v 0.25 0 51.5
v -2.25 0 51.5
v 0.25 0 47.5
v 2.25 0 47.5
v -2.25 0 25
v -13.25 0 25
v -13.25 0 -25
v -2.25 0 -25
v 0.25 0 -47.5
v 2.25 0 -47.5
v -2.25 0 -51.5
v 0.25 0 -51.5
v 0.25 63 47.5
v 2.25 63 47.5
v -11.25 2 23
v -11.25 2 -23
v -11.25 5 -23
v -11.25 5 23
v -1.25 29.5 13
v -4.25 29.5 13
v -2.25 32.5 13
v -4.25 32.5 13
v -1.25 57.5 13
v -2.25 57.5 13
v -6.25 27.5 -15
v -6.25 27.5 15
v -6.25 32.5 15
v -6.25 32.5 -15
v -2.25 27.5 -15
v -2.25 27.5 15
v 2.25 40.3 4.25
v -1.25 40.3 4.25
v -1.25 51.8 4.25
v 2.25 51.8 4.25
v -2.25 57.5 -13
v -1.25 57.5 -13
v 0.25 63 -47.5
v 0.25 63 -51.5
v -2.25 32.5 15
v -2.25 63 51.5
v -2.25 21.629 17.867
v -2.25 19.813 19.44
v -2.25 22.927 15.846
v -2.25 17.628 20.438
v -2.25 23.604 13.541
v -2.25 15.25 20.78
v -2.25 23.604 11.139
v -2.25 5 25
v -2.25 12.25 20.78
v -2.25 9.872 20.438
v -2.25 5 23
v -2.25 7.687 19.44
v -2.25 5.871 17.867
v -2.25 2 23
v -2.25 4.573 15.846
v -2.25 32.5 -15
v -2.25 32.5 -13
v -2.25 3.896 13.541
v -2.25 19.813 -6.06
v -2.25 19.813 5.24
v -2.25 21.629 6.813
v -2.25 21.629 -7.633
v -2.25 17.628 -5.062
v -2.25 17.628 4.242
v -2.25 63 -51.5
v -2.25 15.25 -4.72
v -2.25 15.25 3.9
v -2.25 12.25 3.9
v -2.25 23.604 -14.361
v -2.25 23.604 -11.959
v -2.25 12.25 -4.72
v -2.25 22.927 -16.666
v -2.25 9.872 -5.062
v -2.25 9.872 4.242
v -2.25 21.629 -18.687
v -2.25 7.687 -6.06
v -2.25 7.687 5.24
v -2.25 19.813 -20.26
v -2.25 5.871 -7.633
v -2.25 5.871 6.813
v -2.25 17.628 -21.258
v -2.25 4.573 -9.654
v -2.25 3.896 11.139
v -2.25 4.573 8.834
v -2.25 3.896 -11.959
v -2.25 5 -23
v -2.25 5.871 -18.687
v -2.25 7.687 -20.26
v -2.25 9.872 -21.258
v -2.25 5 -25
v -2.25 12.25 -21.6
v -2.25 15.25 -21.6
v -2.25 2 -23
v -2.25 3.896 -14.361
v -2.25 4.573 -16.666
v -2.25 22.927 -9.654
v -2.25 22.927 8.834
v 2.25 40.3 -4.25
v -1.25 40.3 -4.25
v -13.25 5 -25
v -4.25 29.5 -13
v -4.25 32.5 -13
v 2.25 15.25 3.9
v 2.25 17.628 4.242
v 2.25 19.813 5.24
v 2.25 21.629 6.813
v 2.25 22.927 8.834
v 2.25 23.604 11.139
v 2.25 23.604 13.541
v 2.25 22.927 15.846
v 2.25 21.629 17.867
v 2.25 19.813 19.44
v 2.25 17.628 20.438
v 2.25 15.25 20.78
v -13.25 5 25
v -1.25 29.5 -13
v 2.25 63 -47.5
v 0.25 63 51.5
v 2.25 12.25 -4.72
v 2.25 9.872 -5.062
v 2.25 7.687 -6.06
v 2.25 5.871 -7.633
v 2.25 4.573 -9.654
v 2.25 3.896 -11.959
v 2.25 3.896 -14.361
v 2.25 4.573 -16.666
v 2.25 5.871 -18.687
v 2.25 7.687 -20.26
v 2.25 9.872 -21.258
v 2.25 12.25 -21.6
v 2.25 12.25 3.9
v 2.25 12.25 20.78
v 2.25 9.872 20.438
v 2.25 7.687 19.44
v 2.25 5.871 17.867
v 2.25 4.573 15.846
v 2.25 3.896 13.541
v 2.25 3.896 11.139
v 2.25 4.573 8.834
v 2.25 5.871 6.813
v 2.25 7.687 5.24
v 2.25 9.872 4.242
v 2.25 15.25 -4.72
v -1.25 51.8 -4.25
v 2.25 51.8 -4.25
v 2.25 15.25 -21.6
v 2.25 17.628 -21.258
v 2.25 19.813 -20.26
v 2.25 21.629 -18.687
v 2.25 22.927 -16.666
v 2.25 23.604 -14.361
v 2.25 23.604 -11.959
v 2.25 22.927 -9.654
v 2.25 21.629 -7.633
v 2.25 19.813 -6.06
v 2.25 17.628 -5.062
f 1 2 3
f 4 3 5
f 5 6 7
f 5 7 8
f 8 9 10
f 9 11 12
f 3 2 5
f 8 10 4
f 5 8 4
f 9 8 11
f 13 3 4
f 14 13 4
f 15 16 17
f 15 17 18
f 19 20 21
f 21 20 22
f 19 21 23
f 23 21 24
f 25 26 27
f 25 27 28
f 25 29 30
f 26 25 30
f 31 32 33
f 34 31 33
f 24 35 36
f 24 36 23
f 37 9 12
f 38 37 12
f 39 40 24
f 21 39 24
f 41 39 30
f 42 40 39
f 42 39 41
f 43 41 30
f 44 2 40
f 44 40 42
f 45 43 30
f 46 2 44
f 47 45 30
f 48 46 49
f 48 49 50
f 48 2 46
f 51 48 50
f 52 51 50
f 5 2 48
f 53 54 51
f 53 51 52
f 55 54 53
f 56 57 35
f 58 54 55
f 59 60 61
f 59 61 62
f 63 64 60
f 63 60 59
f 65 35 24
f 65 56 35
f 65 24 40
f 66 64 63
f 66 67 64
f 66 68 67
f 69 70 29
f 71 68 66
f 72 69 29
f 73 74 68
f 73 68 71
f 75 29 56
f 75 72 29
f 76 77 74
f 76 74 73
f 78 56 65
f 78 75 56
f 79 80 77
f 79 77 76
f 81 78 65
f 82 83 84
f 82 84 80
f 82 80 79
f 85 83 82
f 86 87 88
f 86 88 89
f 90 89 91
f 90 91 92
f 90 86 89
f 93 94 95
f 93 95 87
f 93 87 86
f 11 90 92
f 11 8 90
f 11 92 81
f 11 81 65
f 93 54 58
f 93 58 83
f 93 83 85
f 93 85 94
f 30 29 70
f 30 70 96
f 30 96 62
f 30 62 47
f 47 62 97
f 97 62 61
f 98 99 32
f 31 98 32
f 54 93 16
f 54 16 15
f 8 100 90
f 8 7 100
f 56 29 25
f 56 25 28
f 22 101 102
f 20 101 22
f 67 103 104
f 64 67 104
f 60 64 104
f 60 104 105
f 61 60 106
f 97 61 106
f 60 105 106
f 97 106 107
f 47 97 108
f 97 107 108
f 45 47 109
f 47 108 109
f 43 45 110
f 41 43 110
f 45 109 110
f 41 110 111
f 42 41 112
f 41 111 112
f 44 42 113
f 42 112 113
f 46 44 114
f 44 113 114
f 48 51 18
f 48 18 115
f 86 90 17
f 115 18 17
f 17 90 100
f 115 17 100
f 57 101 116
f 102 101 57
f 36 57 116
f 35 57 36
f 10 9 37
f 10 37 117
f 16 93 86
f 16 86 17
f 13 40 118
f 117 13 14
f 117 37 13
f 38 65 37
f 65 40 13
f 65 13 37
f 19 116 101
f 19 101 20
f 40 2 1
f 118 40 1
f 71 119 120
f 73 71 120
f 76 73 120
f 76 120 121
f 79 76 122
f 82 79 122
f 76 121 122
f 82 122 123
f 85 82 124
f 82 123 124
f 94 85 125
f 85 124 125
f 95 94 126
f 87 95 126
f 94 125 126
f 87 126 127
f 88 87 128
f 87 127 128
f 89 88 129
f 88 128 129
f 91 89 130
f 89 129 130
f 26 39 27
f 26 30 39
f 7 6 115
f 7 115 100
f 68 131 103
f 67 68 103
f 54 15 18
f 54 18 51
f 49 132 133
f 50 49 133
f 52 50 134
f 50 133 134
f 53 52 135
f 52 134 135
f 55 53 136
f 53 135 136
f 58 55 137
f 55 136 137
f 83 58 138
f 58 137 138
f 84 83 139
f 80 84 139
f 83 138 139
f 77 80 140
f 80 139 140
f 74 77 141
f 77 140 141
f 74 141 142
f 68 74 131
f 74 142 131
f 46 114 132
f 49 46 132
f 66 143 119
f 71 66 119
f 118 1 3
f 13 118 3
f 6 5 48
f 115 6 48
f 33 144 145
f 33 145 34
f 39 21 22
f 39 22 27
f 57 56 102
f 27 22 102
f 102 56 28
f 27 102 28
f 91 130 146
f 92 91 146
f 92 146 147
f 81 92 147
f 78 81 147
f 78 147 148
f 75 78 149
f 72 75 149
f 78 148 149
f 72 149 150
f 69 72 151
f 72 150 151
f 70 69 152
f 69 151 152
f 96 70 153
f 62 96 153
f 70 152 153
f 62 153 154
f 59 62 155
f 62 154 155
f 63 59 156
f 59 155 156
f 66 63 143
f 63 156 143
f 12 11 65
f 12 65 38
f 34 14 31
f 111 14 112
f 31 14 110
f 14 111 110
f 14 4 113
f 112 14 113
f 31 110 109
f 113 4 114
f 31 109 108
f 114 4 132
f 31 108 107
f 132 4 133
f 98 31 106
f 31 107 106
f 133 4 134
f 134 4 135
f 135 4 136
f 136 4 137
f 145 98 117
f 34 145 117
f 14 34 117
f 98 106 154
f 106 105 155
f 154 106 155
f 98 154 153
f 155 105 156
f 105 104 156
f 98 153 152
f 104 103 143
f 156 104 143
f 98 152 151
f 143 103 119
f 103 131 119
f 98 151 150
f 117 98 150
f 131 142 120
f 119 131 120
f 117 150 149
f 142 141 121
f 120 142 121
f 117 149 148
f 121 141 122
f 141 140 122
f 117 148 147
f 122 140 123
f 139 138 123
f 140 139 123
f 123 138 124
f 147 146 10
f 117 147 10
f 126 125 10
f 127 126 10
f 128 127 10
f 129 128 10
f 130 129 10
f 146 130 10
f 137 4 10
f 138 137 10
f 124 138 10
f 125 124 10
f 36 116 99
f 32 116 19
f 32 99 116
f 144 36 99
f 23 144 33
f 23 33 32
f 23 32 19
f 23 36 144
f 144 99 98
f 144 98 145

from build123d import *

# Parameters (mm, degrees)
SKETCH_1_W          = 2.5
SKETCH_1_H          = 103
SKETCH_1_W_2        = 2
SKETCH_1_H_2        = 95
EXTRUDE_1_DEPTH     = 63
SKETCH_5_W          = 50
SKETCH_5_H          = 2
EXTRUDE_2_DEPTH     = 11
EXTRUDE_3_DEPTH     = 3
CUT_EXTRUDE_1_DEPTH = 4.5
SKETCH_11_W         = 8.5
SKETCH_11_H         = 11.5
CUT_EXTRUDE_2_DEPTH = 4.5
SKETCH_12_W         = 26
SKETCH_12_H         = 28
SKETCH_12_W_2       = 25
SKETCH_12_H_2       = 27
SKETCH_12_W_3       = 8.5
SKETCH_12_H_3       = 11.5
CUT_EXTRUDE_3_DEPTH = 1
SKETCH_13_W         = 30
SKETCH_13_H         = 2
EXTRUDE_4_DEPTH     = 4
EXTRUDE_5_DEPTH     = 3


with BuildPart() as part:
    # 스케치1 → 보스-돌출1 (new body)
    with BuildSketch(Plane(origin=(0, 0, 0), x_dir=(1, 0, 0), z_dir=(0, 1, 0))):
        with Locations((-1, 0)):
            Rectangle(SKETCH_1_W, SKETCH_1_H)
        with Locations((1.25, 0)):
            Rectangle(SKETCH_1_W_2, SKETCH_1_H_2)
    extrude(amount=EXTRUDE_1_DEPTH)

    # 스케치5 → 보스-돌출2 (add)
    with BuildSketch(Plane.ZY.offset(2.25)):
        with Locations((0, 1)):
            Rectangle(SKETCH_5_W, SKETCH_5_H)
    extrude(amount=EXTRUDE_2_DEPTH)

    # 스케치7 → 보스-돌출3 (add)
    with BuildSketch(Plane(origin=(0, 2, 0), x_dir=(1, 0, 0), z_dir=(0, 1, 0))):
        Polygon((-2.25, 23), (-11.25, 23), (-11.25, -23), (-2.25, -23), (-2.25, -25), (-13.25, -25), (-13.25, 25), (-2.25, 25), align=None)
    extrude(amount=EXTRUDE_3_DEPTH)

    # 스케치10 → 컷-돌출1 (cut)
    with BuildSketch(Plane(origin=(2.25, 0, 0), x_dir=(0, 0, -1), z_dir=(1, 0, 0))):
        with BuildLine():
            Line((-20.78, 15.25), (-20.78, 12.25))
            ThreePointArc((-20.78, 12.25), (-12.34, 3.81), (-3.9, 12.25))
            Line((-3.9, 12.25), (-3.9, 15.25))
            ThreePointArc((-3.9, 15.25), (-12.34, 23.69), (-20.78, 15.25))
        make_face()
        with BuildLine():
            Line((4.72, 15.25), (4.72, 12.25))
            ThreePointArc((4.72, 12.25), (13.16, 3.81), (21.6, 12.25))
            Line((21.6, 12.25), (21.6, 15.25))
            ThreePointArc((21.6, 15.25), (13.16, 23.69), (4.72, 15.25))
        make_face()
    extrude(amount=-CUT_EXTRUDE_1_DEPTH, mode=Mode.SUBTRACT)

    # 스케치11 → 컷-돌출2 (cut)
    with BuildSketch(Plane.ZY.offset(2.25)):
        with Locations((0, 46.05)):
            Rectangle(SKETCH_11_W, SKETCH_11_H)
    extrude(amount=-CUT_EXTRUDE_2_DEPTH, mode=Mode.SUBTRACT)

    # 스케치12 → 컷-돌출3 (cut)
    # profile 1 of 2: a face of its own
    with BuildSketch(Plane.ZY.offset(2.25)):
        with Locations((0, 43.5)):
            Rectangle(SKETCH_12_W, SKETCH_12_H)
        with Locations((0, 43.5)):
            Rectangle(SKETCH_12_W_2, SKETCH_12_H_2, mode=Mode.SUBTRACT)
    # profile 2 of 2: a face of its own
    with BuildSketch(Plane.ZY.offset(2.25)):
        with Locations((0, 43.5)):
            Rectangle(SKETCH_12_W_2, SKETCH_12_H_2)
        with Locations((0, 46.05)):
            Rectangle(SKETCH_12_W_3, SKETCH_12_H_3, mode=Mode.SUBTRACT)
    extrude(amount=-CUT_EXTRUDE_3_DEPTH, mode=Mode.SUBTRACT)

    # 스케치13 → 보스-돌출4 (add)
    with BuildSketch(Plane.ZY.offset(2.25)):
        with Locations((0, 28.5)):
            Rectangle(SKETCH_13_W, SKETCH_13_H)
    extrude(amount=EXTRUDE_4_DEPTH)

    # 스케치14 → 보스-돌출5 (add)
    with BuildSketch(Plane(origin=(0, 29.5, 0), x_dir=(1, 0, 0), z_dir=(0, 1, 0))):
        Polygon((-2.25, -13), (-2.25, -15), (-6.25, -15), (-6.25, 15), (-2.25, 15), (-2.25, 13), (-4.25, 13), (-4.25, -13), align=None)
    extrude(amount=EXTRUDE_5_DEPTH)


solid = part.part
